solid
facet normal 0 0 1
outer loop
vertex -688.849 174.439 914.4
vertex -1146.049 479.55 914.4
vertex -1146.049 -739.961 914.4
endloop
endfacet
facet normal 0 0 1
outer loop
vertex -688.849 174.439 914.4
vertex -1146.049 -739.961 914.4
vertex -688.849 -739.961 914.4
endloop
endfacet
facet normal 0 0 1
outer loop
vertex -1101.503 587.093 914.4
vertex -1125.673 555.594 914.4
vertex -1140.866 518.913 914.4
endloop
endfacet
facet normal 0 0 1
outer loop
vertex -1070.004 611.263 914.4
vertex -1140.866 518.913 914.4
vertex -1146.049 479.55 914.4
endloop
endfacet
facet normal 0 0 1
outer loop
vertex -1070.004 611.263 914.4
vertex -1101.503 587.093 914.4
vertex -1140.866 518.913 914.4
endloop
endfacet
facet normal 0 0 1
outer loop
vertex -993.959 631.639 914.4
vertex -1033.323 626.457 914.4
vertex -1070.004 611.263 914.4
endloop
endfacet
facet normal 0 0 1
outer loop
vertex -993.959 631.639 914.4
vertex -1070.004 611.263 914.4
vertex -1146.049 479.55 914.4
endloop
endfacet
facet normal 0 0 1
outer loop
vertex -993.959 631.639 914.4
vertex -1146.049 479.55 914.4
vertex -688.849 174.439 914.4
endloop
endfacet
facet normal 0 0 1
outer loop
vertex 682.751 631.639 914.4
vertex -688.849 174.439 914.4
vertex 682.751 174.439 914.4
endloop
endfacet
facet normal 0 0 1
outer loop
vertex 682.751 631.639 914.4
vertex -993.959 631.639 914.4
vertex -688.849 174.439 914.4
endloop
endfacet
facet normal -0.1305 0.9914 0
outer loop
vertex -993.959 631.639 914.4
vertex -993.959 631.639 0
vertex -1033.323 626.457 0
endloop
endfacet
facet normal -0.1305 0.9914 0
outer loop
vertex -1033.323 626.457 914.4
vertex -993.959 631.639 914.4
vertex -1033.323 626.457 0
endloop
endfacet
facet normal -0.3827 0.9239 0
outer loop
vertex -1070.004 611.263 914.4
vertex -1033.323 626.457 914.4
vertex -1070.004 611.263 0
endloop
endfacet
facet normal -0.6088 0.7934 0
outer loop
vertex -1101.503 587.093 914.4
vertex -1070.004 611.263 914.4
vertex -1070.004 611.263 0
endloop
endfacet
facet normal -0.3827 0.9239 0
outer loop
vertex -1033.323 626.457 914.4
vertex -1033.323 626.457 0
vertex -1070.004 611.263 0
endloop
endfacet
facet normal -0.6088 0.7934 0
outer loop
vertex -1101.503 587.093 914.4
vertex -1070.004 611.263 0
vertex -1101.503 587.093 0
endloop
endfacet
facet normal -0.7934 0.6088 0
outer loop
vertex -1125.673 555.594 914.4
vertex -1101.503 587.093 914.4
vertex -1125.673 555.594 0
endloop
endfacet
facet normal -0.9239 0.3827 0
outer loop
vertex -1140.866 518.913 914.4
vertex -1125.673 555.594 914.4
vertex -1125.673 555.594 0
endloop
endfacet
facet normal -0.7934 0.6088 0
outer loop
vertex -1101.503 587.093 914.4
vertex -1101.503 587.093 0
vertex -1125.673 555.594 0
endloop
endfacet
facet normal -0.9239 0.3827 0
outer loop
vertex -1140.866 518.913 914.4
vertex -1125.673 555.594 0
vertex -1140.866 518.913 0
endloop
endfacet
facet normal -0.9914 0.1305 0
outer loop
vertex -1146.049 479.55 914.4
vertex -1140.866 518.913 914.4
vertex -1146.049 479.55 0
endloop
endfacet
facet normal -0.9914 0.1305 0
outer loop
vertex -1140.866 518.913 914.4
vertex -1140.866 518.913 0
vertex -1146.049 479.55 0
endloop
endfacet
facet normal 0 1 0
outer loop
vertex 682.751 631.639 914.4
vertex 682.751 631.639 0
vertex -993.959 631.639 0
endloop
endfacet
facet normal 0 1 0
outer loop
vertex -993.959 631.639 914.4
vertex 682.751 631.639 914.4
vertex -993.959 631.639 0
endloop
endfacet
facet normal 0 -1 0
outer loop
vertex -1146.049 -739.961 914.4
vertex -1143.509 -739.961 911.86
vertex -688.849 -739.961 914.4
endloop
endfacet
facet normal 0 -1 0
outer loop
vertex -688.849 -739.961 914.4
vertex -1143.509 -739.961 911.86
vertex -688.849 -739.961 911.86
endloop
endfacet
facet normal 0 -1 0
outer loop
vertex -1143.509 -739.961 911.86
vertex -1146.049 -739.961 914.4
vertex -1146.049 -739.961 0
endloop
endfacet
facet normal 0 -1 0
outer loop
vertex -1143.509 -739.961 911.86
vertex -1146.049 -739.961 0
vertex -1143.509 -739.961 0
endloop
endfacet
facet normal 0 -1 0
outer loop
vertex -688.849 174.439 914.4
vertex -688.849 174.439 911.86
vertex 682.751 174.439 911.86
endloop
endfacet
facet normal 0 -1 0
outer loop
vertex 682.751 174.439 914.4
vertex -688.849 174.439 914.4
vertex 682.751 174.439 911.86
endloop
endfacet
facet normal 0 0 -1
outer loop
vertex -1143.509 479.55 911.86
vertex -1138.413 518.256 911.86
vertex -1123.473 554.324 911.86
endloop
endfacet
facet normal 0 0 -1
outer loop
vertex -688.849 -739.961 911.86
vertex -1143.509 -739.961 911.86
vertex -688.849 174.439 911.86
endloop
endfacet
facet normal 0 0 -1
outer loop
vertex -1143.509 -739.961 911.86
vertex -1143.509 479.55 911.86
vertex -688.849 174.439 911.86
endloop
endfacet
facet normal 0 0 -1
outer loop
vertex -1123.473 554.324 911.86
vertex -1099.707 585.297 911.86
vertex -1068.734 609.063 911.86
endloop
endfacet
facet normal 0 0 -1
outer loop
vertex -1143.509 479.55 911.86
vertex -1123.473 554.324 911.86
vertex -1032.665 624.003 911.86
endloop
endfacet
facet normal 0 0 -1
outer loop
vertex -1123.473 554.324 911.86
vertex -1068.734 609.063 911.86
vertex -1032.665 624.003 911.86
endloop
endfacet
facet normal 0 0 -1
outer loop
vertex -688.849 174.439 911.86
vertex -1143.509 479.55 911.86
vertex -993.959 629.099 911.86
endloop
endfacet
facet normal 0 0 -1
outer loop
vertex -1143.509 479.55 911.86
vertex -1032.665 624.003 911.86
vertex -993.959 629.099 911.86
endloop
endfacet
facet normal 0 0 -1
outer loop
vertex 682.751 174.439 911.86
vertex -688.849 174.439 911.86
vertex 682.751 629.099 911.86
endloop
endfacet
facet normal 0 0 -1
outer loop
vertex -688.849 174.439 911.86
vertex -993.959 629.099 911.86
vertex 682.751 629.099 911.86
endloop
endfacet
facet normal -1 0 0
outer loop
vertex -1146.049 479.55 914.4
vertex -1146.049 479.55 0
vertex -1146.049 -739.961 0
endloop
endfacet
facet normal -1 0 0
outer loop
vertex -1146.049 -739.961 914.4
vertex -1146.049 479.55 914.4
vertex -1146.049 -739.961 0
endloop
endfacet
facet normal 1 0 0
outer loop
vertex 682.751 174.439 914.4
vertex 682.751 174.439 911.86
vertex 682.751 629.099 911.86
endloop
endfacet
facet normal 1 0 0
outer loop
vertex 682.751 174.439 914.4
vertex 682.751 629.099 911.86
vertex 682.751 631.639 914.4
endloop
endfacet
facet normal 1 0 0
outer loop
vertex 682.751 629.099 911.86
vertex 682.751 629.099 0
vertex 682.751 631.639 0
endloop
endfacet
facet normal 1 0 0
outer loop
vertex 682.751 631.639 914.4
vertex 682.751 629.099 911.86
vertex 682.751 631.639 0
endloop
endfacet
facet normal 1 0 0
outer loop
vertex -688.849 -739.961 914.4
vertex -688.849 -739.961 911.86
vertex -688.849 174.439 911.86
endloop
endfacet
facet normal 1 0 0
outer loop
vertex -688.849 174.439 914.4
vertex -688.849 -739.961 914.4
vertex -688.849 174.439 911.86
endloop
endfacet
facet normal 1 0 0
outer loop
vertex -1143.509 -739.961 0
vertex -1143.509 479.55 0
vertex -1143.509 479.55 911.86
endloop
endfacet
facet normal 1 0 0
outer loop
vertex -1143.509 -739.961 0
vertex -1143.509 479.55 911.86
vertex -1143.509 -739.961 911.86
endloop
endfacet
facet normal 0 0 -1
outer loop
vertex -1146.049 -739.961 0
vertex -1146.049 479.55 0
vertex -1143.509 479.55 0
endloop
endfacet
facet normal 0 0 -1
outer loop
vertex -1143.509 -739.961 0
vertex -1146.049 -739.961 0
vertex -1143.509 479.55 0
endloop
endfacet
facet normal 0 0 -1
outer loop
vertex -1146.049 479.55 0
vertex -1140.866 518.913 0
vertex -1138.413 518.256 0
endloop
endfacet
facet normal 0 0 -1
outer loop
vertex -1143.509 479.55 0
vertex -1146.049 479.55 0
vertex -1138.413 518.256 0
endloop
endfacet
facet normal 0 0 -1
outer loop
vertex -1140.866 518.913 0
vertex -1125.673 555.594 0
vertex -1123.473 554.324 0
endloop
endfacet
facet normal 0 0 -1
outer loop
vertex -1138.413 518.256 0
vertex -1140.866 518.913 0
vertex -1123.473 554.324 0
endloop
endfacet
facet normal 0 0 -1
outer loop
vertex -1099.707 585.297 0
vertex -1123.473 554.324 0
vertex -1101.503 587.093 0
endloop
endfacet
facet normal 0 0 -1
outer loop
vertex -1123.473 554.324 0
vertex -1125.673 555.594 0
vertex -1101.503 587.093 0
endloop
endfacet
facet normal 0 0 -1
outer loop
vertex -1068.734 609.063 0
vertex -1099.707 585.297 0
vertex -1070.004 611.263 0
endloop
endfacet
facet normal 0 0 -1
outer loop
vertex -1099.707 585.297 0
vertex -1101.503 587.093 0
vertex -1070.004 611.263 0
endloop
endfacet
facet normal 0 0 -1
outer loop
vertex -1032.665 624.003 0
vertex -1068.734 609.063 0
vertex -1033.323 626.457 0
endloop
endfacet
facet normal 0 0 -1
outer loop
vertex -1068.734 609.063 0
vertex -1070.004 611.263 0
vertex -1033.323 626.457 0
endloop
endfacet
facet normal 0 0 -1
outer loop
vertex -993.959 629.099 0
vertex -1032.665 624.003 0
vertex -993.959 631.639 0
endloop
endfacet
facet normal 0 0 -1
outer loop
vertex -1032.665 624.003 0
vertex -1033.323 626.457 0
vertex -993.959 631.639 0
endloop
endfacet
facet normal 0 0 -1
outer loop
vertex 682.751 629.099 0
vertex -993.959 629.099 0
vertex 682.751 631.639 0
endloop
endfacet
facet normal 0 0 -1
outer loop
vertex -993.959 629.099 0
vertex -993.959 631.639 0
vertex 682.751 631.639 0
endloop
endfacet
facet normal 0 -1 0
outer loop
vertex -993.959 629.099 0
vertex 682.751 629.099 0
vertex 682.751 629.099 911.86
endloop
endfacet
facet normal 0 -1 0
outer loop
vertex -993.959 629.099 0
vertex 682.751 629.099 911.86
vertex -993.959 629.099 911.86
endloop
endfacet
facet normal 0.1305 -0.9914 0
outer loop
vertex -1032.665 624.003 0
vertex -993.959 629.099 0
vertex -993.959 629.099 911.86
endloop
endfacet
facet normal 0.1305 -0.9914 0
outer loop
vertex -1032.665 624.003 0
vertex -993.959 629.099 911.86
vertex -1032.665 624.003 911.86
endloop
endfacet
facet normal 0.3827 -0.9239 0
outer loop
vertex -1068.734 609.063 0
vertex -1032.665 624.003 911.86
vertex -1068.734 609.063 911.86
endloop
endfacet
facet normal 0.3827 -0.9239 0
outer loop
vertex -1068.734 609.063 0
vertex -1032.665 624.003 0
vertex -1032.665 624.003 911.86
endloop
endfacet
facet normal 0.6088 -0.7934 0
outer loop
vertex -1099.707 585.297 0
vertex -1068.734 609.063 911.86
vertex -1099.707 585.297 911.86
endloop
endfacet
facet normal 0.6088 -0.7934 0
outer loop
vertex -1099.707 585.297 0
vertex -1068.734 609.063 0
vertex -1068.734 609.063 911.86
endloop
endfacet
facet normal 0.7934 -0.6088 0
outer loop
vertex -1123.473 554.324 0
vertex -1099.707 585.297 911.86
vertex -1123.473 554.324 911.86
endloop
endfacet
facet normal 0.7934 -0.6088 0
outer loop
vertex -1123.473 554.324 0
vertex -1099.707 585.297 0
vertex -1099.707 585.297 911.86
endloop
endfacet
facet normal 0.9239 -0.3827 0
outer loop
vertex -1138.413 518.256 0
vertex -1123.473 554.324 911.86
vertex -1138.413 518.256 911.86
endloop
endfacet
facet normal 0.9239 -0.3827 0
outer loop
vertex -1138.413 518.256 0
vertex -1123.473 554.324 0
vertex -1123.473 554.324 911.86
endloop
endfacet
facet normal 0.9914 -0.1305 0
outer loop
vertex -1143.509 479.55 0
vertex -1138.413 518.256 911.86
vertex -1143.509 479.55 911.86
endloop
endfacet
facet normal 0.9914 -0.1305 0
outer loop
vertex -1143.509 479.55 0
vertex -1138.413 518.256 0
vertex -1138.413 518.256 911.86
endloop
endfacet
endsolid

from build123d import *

# Parameters (mm, degrees)
F0_W     = 457.2
F0_H     = 914.4
F1_DEPTH = 914.4
F2_T     = -2.54


with BuildPart() as f1:
    # F0 (on Top) → F1 (new body)
    with BuildSketch(Plane.XY):
        with BuildLine():
            Line((682.751235, 631.639176), (-993.959226, 631.639176))
            ThreePointArc((-993.959226, 631.639176), (-1101.50277, 587.093182), (-1146.048765, 479.549638))
            Line((-1146.048765, 479.549638), (-1146.048765, 174.439176))
            Line((-1146.048765, 174.439176), (-688.848765, 174.439176))
            Line((-688.848765, 174.439176), (682.751235, 174.439176))
            Line((682.751235, 174.439176), (682.751235, 631.639176))
        make_face()
        with Locations((-917.448765, -282.760824)):
            Rectangle(F0_W, F0_H)
    extrude(amount=F1_DEPTH)

    # F2
    f2_openings = [f1.faces().sort_by_distance(p)[0] for p in [
        (-3.048765, 174.439176, 457.2),
        (682.751235, 403.039176, 457.2),
        (-917.448765, -739.960824, 457.2),
        (-688.848765, -282.760824, 457.2),
        (659.891235, 403.039176, 0),
    ]]
    offset(amount=F2_T, openings=f2_openings)


solid = f1.part
